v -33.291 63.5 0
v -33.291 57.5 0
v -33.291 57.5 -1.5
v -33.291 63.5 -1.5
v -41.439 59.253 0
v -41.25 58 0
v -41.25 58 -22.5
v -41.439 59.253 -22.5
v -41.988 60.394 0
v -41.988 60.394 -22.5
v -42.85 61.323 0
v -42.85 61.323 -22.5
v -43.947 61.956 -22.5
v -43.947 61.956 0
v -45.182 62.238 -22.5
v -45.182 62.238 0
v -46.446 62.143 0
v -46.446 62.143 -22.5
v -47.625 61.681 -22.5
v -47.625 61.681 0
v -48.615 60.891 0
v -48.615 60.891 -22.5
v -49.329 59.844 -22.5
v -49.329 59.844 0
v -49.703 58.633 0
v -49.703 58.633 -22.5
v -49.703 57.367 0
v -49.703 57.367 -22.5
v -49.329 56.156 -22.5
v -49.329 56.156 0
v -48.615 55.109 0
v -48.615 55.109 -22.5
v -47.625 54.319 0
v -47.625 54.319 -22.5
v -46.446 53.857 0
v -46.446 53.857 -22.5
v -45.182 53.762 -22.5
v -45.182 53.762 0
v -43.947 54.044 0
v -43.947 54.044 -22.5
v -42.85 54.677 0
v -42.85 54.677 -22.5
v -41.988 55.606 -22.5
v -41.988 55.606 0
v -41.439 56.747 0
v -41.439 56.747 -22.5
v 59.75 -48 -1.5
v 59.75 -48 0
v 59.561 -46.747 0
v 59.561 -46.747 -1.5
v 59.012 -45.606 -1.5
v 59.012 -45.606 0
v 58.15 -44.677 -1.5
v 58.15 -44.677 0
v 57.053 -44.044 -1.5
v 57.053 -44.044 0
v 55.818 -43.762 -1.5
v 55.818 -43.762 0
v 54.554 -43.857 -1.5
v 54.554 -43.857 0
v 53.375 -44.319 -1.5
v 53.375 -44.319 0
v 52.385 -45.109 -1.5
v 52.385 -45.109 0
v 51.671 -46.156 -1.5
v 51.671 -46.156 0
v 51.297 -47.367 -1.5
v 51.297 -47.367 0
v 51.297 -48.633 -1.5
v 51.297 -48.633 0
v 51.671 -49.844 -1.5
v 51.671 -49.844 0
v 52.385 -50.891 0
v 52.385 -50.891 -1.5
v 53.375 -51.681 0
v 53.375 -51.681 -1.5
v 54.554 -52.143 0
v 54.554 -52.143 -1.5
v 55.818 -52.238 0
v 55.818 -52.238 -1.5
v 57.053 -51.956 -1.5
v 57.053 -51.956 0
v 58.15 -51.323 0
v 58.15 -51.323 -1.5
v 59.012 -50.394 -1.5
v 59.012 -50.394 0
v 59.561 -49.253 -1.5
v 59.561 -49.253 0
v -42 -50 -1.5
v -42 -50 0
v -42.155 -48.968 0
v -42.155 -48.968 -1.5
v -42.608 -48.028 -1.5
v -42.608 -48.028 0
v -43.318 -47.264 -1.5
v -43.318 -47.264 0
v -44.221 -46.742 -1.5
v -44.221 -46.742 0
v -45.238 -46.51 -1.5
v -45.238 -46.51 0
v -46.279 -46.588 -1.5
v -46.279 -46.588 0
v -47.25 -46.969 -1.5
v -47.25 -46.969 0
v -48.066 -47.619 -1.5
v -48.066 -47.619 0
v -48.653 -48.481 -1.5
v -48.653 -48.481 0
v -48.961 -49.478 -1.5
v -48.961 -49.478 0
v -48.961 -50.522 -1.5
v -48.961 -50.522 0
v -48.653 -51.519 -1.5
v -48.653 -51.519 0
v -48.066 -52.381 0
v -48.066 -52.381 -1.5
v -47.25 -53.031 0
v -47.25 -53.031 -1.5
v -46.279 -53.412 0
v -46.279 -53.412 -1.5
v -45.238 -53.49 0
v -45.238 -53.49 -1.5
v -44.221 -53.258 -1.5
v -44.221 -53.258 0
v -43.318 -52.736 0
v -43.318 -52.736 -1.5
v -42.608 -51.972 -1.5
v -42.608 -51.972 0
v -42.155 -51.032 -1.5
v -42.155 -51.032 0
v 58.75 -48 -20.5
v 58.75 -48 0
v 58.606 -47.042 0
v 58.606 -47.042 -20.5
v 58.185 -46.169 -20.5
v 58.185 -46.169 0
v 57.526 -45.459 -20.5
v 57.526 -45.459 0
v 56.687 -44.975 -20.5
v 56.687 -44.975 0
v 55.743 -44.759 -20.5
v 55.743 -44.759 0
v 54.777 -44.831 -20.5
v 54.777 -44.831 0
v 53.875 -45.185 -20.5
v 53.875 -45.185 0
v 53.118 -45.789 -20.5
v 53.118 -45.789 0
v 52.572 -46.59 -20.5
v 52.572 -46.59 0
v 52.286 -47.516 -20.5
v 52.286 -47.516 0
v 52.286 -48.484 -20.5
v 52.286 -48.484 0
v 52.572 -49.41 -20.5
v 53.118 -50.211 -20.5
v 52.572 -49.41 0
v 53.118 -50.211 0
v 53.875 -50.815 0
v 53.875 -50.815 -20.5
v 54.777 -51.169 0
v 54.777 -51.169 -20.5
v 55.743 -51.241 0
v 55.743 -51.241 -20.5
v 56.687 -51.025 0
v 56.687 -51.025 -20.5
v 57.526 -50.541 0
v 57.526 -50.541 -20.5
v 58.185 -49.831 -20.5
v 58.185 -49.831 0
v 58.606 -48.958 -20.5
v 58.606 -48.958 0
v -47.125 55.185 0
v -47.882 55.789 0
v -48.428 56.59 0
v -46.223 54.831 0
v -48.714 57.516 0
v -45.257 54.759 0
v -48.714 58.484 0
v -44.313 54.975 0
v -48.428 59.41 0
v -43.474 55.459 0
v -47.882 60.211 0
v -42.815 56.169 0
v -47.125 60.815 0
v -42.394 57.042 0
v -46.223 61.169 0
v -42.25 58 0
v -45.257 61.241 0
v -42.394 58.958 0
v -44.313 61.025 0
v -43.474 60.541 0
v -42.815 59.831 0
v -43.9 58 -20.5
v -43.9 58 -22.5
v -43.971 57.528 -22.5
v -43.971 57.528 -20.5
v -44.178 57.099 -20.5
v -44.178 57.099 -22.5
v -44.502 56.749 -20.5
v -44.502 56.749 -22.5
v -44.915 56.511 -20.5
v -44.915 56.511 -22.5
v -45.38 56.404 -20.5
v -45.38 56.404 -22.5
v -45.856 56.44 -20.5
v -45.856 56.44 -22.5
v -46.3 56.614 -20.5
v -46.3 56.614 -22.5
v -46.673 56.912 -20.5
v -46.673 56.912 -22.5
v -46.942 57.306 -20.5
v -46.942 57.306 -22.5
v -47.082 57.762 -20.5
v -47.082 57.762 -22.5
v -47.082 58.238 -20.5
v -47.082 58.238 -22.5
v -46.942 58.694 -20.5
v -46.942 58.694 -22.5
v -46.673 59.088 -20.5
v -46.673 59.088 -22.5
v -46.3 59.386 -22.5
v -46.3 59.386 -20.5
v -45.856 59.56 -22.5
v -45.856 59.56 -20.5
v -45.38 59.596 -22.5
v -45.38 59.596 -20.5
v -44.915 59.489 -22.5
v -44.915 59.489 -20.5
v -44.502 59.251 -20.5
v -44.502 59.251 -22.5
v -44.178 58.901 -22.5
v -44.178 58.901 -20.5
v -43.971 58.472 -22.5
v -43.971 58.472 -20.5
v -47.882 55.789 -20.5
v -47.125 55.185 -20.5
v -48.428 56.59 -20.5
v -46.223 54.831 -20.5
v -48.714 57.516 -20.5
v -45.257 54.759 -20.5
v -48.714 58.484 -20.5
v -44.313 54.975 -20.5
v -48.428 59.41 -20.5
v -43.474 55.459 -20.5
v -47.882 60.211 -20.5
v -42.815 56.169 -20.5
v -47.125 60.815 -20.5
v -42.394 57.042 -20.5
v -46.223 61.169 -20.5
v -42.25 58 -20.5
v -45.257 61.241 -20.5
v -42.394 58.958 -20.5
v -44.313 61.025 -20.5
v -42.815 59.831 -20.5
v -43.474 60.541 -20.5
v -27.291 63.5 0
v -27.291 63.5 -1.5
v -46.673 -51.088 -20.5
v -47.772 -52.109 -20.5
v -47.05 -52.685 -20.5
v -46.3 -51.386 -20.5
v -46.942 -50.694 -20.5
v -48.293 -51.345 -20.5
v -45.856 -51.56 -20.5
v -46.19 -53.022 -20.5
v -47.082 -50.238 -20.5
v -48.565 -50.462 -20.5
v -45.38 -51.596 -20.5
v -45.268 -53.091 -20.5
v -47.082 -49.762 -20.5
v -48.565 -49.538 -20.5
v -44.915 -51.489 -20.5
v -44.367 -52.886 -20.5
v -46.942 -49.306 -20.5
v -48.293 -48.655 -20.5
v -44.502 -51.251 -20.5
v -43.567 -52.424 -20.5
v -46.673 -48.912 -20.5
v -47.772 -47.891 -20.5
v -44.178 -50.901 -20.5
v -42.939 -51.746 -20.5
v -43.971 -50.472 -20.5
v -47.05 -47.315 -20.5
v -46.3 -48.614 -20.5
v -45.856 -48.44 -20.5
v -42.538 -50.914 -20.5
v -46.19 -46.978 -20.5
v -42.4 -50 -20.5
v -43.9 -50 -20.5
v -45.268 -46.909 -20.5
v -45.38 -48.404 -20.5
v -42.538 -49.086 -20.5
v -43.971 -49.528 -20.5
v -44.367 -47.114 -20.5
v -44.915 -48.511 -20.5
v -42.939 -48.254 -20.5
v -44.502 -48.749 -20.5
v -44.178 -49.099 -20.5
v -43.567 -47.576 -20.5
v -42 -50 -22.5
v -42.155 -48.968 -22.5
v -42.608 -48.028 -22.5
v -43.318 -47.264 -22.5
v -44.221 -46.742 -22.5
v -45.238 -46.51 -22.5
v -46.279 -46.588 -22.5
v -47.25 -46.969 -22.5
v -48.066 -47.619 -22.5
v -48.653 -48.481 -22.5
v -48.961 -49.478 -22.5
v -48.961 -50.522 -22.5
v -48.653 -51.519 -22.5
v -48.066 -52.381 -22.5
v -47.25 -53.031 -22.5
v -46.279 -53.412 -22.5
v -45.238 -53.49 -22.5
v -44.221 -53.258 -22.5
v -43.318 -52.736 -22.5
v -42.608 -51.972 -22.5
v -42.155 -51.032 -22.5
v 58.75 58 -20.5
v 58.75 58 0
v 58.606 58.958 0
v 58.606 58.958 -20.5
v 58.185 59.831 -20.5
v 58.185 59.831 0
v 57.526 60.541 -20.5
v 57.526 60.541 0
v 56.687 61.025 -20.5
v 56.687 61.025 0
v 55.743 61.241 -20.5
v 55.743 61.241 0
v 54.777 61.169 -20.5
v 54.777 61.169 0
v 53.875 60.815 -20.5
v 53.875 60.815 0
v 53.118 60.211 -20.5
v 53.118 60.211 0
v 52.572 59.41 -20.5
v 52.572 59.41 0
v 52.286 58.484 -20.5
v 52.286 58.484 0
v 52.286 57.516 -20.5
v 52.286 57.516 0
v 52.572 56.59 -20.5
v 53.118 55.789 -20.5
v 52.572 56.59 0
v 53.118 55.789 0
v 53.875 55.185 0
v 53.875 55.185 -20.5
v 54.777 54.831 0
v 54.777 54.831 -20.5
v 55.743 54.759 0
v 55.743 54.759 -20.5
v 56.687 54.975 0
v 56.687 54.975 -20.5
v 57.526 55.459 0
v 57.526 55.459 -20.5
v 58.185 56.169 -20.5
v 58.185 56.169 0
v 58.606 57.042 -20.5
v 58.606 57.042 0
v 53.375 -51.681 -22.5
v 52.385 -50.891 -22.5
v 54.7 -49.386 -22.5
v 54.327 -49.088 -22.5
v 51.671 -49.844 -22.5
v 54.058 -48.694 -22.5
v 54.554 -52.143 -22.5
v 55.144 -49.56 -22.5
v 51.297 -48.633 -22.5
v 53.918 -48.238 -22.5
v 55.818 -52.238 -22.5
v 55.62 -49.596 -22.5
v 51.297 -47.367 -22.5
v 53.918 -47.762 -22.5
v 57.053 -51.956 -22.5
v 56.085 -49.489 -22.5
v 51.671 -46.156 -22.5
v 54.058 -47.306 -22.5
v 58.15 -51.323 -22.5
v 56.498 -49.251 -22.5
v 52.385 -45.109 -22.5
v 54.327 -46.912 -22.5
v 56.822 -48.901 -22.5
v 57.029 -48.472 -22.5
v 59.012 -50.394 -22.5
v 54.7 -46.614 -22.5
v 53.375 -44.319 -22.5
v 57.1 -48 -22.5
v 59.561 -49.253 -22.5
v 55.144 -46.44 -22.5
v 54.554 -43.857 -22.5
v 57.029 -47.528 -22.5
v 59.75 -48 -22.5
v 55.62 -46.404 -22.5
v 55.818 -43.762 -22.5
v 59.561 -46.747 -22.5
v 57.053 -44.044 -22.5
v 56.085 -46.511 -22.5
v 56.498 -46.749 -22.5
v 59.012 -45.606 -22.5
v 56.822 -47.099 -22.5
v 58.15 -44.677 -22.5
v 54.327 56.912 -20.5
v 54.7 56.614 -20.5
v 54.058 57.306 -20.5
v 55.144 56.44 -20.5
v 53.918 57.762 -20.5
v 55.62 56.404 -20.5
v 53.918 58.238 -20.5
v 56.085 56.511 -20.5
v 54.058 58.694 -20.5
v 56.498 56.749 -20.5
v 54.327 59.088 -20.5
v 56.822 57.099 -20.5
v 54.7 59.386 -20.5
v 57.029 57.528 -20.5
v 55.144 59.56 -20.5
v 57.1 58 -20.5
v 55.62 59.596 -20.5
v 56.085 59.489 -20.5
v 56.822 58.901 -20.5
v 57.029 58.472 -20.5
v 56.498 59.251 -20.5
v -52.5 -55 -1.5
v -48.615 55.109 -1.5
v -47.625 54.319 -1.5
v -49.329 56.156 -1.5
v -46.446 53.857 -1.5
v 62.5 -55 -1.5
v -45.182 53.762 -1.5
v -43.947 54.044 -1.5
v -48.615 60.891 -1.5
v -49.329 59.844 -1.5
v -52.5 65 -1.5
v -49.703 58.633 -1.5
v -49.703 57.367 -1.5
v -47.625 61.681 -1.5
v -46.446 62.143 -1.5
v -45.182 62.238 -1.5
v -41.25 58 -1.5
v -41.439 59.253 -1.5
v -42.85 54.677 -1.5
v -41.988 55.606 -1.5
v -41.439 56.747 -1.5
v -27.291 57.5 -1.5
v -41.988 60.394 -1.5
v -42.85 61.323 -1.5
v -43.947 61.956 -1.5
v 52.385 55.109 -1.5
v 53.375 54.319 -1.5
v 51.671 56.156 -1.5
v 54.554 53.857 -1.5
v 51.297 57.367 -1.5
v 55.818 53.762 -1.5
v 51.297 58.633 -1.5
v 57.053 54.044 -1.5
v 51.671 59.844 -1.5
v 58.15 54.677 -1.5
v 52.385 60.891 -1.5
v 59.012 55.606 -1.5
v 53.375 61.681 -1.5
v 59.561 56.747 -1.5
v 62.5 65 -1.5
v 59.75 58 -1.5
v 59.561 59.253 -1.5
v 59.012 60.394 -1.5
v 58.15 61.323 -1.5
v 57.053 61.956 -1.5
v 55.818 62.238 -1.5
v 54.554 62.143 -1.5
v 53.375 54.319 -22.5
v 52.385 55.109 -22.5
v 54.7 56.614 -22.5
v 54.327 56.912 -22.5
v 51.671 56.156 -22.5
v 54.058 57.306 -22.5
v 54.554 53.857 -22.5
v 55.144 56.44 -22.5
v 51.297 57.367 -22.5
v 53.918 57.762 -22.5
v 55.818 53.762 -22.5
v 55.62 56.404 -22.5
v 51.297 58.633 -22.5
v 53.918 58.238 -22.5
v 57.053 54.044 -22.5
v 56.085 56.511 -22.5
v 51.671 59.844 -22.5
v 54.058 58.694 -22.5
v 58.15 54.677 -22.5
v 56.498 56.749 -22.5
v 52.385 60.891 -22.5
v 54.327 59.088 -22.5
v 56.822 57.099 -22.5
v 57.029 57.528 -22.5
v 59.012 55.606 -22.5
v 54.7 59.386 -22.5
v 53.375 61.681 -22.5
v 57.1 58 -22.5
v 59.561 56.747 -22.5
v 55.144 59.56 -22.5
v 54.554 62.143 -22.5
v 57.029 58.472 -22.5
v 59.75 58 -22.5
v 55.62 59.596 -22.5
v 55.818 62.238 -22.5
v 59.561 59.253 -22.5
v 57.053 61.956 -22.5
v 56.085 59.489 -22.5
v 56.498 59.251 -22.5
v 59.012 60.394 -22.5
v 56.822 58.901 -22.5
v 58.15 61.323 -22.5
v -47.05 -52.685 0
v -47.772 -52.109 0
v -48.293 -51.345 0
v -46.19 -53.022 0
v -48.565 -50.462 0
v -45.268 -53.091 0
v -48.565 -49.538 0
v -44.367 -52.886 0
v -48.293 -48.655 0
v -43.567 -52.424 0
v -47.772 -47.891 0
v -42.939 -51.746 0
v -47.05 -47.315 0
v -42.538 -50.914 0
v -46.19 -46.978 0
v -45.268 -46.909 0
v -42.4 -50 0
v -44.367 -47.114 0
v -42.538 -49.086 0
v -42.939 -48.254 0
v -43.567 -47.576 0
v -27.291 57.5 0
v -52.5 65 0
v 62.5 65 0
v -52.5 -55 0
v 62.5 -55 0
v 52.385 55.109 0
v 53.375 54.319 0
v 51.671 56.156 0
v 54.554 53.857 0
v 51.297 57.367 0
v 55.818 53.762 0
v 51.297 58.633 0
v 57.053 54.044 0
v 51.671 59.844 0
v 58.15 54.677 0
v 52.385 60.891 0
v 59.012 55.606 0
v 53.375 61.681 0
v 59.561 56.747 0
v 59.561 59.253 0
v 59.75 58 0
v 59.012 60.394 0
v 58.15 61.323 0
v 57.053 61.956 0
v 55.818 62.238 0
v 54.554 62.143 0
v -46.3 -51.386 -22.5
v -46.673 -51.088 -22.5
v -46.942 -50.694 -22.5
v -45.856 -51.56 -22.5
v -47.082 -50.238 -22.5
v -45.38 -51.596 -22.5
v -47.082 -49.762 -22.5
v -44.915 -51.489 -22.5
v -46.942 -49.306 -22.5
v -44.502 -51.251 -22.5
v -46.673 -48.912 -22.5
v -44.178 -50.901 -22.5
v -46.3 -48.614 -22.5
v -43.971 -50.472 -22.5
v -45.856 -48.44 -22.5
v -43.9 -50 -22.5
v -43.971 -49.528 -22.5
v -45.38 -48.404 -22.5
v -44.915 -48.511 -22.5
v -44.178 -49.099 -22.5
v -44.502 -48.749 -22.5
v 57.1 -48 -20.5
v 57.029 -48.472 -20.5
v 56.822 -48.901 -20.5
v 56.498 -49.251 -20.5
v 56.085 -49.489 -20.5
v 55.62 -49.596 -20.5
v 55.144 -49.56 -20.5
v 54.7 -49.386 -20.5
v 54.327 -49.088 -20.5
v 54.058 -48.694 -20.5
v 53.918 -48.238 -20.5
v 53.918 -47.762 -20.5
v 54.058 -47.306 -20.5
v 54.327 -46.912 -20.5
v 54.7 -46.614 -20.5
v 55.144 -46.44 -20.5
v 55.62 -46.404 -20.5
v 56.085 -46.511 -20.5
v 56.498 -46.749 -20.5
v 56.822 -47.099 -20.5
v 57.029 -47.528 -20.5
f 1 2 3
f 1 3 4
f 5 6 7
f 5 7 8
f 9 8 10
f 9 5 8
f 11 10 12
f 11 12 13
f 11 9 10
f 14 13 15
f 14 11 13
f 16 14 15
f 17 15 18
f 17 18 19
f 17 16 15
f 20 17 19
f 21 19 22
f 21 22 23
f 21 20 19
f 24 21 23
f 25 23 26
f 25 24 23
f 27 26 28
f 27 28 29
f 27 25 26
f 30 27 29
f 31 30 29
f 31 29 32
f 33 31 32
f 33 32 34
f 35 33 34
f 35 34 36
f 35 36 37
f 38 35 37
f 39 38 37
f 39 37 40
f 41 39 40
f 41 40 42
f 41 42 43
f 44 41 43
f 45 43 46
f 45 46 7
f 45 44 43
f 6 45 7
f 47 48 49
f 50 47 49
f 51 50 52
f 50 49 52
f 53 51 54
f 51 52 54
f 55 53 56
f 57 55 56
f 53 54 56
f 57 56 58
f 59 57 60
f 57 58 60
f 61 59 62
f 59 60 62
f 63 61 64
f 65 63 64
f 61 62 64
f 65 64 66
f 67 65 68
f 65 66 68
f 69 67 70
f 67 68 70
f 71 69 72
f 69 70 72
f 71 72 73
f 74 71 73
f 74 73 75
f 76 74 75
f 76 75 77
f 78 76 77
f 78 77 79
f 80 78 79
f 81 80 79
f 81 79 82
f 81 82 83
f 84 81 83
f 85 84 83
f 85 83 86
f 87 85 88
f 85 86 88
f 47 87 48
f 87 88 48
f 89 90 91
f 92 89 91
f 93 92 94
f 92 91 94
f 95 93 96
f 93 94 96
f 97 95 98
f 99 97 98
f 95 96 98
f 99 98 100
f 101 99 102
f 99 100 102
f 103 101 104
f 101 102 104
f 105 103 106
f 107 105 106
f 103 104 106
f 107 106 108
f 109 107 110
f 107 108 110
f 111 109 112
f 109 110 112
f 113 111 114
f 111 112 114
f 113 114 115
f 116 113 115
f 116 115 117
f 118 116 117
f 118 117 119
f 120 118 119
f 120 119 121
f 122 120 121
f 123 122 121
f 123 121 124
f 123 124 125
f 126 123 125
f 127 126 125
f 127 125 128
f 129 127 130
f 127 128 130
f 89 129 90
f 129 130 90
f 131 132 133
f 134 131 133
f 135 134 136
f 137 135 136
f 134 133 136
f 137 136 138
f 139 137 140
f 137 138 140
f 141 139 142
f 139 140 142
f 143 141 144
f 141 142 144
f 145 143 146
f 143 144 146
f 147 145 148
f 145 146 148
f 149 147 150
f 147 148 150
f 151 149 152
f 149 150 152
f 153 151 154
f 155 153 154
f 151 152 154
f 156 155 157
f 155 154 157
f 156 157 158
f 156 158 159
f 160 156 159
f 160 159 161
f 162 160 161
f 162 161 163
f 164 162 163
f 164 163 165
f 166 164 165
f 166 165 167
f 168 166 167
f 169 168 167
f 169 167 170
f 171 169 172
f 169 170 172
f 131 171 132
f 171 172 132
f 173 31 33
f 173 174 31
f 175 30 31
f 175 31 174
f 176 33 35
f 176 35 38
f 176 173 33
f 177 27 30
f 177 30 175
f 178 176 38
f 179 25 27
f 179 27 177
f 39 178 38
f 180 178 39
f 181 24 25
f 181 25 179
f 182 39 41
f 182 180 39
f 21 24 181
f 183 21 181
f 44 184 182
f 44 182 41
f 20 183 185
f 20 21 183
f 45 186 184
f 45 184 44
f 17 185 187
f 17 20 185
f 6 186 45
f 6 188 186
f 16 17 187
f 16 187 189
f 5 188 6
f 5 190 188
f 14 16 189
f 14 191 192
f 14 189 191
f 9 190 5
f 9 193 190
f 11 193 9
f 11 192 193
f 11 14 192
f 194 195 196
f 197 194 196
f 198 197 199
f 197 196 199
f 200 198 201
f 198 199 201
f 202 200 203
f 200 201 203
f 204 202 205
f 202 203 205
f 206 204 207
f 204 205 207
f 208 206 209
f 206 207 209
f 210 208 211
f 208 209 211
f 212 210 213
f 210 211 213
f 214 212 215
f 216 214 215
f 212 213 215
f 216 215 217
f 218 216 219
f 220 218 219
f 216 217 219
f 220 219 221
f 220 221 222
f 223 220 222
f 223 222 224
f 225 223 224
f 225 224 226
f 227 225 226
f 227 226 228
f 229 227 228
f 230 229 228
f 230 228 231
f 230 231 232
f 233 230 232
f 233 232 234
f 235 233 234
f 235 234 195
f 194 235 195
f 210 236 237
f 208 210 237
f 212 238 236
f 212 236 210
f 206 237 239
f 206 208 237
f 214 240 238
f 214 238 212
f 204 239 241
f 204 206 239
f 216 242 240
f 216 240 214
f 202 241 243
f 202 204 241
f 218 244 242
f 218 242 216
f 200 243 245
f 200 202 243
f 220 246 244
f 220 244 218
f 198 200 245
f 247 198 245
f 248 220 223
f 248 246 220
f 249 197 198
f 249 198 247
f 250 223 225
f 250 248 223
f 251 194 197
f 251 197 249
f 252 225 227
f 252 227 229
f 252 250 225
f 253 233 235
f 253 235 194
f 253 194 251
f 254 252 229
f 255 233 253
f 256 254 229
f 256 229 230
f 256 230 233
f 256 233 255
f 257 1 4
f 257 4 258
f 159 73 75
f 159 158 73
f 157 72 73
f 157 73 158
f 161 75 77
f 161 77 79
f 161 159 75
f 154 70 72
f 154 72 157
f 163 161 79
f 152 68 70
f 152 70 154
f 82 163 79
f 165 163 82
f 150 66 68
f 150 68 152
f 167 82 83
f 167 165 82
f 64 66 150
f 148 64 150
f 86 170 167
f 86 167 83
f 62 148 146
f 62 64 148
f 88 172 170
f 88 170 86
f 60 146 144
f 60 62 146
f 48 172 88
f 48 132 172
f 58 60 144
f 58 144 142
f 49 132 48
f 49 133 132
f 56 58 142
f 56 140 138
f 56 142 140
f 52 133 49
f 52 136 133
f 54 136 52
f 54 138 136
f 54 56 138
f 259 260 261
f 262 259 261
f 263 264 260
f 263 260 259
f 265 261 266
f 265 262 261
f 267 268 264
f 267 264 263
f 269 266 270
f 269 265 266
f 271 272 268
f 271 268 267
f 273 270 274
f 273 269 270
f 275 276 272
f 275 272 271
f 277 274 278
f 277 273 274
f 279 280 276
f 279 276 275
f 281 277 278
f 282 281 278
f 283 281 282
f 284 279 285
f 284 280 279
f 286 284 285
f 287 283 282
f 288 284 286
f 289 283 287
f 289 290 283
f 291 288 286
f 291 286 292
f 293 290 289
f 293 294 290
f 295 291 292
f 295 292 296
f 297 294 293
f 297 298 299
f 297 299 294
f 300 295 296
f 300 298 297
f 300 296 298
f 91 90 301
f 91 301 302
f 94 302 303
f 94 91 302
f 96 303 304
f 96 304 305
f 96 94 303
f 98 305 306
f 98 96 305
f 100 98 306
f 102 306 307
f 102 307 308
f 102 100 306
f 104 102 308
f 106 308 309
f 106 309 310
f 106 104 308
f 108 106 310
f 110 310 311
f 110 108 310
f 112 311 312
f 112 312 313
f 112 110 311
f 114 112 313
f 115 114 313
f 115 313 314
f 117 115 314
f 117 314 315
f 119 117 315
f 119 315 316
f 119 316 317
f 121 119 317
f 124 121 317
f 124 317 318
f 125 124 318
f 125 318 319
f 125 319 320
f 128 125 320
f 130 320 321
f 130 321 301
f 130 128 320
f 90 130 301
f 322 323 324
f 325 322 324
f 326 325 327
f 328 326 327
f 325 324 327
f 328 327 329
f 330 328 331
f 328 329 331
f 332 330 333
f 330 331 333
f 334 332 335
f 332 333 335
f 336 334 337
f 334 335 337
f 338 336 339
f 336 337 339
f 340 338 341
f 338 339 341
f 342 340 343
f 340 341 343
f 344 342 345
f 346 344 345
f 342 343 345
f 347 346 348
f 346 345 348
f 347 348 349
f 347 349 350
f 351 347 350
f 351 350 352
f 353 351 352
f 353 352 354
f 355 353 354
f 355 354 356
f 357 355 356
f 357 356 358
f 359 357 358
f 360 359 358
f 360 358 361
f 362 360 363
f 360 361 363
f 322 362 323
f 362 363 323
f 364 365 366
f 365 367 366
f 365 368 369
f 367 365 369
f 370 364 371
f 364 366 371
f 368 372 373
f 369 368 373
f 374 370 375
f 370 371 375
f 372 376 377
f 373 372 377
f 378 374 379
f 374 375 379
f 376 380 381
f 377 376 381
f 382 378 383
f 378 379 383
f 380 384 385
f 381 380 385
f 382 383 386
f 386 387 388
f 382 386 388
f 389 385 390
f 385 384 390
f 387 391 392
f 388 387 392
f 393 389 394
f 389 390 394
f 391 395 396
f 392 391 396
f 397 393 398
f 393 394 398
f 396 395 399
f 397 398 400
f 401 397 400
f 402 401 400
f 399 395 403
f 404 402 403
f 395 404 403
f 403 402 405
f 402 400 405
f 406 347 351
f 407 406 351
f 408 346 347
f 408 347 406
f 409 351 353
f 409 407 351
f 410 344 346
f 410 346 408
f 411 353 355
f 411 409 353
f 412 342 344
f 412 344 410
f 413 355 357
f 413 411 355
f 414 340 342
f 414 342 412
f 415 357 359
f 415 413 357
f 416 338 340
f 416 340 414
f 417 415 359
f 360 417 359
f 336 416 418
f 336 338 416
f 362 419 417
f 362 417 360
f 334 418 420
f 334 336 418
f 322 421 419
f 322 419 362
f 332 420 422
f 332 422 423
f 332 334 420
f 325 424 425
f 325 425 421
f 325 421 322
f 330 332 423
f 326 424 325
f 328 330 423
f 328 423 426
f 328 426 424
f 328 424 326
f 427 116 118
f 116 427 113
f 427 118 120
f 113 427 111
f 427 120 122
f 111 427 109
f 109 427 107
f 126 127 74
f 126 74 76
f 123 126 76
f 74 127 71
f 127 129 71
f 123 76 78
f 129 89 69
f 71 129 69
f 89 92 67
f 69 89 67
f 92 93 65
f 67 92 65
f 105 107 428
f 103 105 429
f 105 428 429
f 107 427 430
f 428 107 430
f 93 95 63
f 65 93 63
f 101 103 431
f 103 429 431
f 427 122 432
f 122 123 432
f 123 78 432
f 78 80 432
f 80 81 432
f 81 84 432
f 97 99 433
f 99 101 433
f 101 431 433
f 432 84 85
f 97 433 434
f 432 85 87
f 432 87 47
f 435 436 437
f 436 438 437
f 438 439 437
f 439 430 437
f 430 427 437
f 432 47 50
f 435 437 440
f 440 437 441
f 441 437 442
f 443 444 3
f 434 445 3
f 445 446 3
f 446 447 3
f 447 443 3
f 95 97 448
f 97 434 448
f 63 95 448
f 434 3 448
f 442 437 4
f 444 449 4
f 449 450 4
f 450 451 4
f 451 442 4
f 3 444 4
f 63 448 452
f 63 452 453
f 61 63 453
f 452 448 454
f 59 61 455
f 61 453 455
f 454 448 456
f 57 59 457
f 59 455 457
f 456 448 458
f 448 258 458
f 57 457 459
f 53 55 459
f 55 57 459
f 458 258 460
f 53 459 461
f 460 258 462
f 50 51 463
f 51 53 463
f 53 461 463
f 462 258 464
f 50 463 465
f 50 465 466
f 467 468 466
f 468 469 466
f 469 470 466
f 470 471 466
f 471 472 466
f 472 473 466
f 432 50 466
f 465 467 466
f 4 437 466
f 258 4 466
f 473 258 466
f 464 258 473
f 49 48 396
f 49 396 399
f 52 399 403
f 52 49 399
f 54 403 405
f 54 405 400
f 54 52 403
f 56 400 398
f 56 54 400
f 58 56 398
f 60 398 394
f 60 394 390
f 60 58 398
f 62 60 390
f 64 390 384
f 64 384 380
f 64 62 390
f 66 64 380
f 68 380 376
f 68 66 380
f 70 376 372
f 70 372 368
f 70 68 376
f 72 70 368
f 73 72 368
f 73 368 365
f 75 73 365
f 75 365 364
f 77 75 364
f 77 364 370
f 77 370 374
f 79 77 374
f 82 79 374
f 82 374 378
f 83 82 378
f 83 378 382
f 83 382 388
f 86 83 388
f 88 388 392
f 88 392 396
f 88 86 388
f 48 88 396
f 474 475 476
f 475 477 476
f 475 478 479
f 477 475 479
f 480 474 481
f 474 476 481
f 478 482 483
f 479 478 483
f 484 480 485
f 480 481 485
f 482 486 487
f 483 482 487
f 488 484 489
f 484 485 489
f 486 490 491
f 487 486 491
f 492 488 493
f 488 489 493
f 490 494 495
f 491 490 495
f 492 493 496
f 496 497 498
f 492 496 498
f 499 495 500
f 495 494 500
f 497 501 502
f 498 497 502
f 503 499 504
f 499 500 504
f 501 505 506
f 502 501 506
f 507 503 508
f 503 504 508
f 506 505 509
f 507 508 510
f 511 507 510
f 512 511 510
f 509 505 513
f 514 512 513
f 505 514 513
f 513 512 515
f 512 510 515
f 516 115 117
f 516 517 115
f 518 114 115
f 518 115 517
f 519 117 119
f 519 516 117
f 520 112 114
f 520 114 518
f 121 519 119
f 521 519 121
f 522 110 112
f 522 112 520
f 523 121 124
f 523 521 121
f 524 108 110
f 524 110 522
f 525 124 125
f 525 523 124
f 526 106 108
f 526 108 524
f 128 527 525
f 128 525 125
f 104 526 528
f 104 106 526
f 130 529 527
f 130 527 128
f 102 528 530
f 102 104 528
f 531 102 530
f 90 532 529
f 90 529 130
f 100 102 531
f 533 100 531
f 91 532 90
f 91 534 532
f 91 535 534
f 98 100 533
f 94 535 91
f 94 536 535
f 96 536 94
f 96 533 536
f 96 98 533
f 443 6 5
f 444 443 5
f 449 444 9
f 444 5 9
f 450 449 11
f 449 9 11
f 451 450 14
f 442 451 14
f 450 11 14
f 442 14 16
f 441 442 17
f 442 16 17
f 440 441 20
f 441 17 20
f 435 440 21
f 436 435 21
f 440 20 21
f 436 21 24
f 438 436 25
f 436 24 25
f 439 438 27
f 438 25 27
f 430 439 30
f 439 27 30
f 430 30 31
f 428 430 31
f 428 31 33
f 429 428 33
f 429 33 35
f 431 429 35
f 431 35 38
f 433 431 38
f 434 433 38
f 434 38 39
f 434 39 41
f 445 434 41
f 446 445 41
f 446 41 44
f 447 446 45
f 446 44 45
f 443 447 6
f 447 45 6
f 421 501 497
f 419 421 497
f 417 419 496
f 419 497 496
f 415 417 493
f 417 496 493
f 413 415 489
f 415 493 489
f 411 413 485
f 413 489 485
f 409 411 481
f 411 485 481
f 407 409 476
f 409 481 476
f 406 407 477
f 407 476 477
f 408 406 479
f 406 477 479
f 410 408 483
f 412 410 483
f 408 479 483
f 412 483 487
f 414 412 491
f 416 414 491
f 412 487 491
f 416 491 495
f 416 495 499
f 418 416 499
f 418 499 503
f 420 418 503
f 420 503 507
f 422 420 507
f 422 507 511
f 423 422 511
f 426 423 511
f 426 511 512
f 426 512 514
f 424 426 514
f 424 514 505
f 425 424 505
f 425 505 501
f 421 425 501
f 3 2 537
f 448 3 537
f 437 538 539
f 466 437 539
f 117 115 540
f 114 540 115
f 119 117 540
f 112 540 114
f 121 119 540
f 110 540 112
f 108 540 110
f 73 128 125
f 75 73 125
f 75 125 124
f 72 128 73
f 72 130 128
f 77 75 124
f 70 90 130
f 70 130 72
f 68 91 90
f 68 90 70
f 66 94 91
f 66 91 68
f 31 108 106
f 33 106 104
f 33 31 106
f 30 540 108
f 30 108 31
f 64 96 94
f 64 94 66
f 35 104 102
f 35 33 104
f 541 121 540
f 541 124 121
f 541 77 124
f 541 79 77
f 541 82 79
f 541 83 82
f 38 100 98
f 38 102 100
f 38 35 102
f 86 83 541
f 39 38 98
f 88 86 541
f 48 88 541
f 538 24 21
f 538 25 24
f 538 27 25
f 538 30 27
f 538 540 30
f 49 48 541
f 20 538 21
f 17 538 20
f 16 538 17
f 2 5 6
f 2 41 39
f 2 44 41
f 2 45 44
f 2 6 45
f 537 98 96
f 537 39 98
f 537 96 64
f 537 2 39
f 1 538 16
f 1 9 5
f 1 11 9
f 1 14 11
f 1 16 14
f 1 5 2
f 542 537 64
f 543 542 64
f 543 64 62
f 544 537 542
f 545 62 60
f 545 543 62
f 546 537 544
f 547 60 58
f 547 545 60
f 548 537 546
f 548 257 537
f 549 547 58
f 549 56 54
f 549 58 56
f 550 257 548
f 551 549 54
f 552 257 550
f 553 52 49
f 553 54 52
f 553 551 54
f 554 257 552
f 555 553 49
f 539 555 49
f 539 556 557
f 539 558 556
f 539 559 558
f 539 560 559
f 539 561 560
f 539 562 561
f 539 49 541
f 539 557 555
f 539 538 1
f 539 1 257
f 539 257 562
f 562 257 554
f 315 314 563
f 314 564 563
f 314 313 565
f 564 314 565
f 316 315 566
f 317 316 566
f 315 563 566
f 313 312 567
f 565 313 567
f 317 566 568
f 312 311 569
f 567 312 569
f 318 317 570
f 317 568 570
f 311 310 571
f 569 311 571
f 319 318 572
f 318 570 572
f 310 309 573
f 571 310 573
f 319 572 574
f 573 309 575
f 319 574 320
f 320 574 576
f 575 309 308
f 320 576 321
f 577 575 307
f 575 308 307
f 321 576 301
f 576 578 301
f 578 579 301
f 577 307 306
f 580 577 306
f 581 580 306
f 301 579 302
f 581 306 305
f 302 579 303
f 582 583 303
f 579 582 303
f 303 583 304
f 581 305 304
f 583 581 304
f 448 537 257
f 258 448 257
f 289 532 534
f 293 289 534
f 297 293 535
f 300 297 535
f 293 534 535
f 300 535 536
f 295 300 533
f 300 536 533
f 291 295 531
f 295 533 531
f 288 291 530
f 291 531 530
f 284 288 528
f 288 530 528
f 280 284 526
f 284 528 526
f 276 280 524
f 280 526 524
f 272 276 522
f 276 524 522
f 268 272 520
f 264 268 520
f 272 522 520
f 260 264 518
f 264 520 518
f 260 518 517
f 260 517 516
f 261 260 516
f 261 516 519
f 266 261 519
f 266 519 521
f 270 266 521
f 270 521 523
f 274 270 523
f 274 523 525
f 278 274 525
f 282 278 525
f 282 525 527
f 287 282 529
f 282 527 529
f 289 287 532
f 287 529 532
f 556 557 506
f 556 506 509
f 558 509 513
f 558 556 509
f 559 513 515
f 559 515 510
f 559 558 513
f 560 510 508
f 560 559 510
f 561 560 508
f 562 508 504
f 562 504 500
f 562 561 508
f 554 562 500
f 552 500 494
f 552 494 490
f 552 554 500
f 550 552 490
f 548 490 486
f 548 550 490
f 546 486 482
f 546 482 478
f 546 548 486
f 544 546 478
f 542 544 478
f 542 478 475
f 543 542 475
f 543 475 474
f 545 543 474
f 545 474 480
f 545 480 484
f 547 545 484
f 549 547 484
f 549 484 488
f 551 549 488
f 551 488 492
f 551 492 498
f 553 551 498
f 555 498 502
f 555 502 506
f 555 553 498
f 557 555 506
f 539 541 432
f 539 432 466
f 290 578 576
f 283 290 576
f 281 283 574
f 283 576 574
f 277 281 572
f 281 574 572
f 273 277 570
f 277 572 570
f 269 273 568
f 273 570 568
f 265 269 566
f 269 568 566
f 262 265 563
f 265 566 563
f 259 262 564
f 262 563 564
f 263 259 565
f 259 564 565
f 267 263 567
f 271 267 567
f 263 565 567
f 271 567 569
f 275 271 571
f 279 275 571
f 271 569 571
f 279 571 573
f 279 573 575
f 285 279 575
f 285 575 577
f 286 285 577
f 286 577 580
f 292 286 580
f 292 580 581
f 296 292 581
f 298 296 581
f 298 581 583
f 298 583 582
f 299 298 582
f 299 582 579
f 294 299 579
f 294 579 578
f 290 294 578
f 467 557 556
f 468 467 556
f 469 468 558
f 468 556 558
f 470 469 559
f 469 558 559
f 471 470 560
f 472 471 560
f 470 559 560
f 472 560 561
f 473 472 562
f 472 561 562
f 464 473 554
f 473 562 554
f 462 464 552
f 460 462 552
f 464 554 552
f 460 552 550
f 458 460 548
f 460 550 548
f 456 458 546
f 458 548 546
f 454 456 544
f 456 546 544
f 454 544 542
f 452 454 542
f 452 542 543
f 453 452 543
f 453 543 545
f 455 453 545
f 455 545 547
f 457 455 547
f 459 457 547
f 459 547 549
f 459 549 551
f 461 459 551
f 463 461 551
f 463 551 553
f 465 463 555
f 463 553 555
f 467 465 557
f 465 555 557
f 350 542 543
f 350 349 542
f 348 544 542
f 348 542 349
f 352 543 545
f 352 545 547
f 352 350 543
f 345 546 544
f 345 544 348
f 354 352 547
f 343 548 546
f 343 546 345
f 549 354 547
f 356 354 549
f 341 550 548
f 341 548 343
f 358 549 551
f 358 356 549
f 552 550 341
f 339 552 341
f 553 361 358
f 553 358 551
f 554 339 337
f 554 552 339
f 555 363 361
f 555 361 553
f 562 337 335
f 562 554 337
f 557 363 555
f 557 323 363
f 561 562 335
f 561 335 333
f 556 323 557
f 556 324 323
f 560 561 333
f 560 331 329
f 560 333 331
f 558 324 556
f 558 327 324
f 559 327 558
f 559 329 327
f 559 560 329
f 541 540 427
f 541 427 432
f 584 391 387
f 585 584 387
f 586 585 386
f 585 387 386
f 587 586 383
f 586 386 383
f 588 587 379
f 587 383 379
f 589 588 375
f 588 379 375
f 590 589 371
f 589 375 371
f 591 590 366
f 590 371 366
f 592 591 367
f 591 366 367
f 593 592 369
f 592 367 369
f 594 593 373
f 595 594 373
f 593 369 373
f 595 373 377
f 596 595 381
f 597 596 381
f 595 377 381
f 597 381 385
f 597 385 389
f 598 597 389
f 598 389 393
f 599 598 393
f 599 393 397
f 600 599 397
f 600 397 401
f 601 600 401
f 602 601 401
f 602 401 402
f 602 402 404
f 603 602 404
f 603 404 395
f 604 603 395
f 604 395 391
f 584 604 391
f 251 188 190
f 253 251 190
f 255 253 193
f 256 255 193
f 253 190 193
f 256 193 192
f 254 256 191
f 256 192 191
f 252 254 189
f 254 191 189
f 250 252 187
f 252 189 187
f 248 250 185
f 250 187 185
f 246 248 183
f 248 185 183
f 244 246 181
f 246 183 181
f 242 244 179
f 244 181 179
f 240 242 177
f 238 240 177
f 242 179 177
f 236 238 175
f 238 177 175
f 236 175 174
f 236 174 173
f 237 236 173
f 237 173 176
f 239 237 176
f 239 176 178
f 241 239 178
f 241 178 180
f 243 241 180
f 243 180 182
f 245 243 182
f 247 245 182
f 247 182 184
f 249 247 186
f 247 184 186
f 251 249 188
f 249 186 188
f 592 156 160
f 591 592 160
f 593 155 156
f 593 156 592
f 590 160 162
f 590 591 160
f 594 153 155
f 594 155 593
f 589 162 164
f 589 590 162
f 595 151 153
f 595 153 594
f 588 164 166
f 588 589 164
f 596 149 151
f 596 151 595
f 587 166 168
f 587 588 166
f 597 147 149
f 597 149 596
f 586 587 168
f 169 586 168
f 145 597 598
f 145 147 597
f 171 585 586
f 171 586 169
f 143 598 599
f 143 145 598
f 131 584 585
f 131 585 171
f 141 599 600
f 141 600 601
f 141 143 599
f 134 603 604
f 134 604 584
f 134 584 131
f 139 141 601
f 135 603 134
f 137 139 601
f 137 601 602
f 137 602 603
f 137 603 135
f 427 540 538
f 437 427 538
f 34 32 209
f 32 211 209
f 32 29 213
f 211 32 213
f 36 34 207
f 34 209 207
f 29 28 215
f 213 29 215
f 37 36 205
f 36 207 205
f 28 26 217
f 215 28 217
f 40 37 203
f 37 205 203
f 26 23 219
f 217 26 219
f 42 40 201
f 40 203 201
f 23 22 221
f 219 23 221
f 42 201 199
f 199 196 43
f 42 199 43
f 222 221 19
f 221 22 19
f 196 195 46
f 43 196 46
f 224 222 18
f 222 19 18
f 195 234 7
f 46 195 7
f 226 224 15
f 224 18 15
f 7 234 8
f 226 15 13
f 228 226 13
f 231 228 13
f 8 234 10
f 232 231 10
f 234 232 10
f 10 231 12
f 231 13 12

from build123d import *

# Parameters (mm, degrees)
F0_W      = 115
F0_H      = 120
F0_R      = 3.5
F0_R_2    = 4.25
F0_W_2    = 6
F0_H_2    = 6
F1_DEPTH  = 1.5
F2_DEPTH  = 22.5
F3_R      = 3.25
F4_DEPTH  = 20.5
F5_R      = 3.25
F6_DEPTH  = 20.5
F7_R      = 3.1
F8_DEPTH  = 20.5
F9_R      = 3.25
F10_DEPTH = 20.5
F11_R     = 1.6
F12_DEPTH = 2.5
F13_R     = 1.6
F14_DEPTH = 2.5
F15_R     = 1.6
F16_DEPTH = 2.5
F17_R     = 1.6
F18_DEPTH = 2.5


with BuildPart() as f1:
    # F0 (on Top) → F1 (new body)
    with BuildSketch(Plane.XY):
        with Locations((5, 5)):
            Rectangle(F0_W, F0_H)
        with Locations((-45.5, -50)):
            Circle(F0_R, mode=Mode.SUBTRACT)
        with Locations((55.5, -48)):
            Circle(F0_R_2, mode=Mode.SUBTRACT)
        with Locations((-45.5, 58)):
            Circle(F0_R_2, mode=Mode.SUBTRACT)
        with Locations((-30.291278, 60.5)):
            Rectangle(F0_W_2, F0_H_2, mode=Mode.SUBTRACT)
        with Locations((55.5, 58)):
            Circle(F0_R_2, mode=Mode.SUBTRACT)
    extrude(amount=-F1_DEPTH)


with BuildPart() as f2:
    # F0 (on Top) → F2 (new body)
    with BuildSketch(Plane.XY):
        with Locations((-45.5, 58)):
            Circle(F0_R_2)
        with Locations((55.5, 58)):
            Circle(F0_R_2)
        with Locations((-45.5, -50)):
            Circle(F0_R)
        with Locations((55.5, -48)):
            Circle(F0_R_2)
    extrude(amount=-F2_DEPTH)

    # F3 (on face) → F4 (cut)
    with BuildSketch(Plane.XY):
        with Locations((55.5, 58)):
            Circle(F3_R)
    extrude(amount=-F4_DEPTH, mode=Mode.SUBTRACT)

    # F5 (on face) → F6 (cut)
    with BuildSketch(Plane.XY):
        with Locations((-45.5, 58)):
            Circle(F5_R)
    extrude(amount=-F6_DEPTH, mode=Mode.SUBTRACT)

    # F7 (on face) → F8 (cut)
    with BuildSketch(Plane.XY):
        with Locations((-45.5, -50)):
            Circle(F7_R)
    extrude(amount=-F8_DEPTH, mode=Mode.SUBTRACT)

    # F9 (on face) → F10 (cut)
    with BuildSketch(Plane.XY):
        with Locations((55.5, -48)):
            Circle(F9_R)
    extrude(amount=-F10_DEPTH, mode=Mode.SUBTRACT)

    # F11 (on face) → F12 (cut)
    with BuildSketch(Plane(origin=(0, 0, -22.5), x_dir=(1, 0, 0), z_dir=(0, 0, -1))):
        with Locations((-45.5, 50)):
            Circle(F11_R)
    extrude(amount=-F12_DEPTH, mode=Mode.SUBTRACT)

    # F13 (on face) → F14 (cut)
    with BuildSketch(Plane(origin=(0, 0, -22.5), x_dir=(1, 0, 0), z_dir=(0, 0, -1))):
        with Locations((-45.5, -58)):
            Circle(F13_R)
    extrude(amount=-F14_DEPTH, mode=Mode.SUBTRACT)

    # F15 (on face) → F16 (cut)
    with BuildSketch(Plane(origin=(0, 0, -22.5), x_dir=(1, 0, 0), z_dir=(0, 0, -1))):
        with Locations((55.5, -58)):
            Circle(F15_R)
    extrude(amount=-F16_DEPTH, mode=Mode.SUBTRACT)

    # F17 (on face) → F18 (cut)
    with BuildSketch(Plane(origin=(0, 0, -22.5), x_dir=(1, 0, 0), z_dir=(0, 0, -1))):
        with Locations((55.5, 48)):
            Circle(F17_R)
    extrude(amount=-F18_DEPTH, mode=Mode.SUBTRACT)


solid = Compound([f1.part, f2.part])
